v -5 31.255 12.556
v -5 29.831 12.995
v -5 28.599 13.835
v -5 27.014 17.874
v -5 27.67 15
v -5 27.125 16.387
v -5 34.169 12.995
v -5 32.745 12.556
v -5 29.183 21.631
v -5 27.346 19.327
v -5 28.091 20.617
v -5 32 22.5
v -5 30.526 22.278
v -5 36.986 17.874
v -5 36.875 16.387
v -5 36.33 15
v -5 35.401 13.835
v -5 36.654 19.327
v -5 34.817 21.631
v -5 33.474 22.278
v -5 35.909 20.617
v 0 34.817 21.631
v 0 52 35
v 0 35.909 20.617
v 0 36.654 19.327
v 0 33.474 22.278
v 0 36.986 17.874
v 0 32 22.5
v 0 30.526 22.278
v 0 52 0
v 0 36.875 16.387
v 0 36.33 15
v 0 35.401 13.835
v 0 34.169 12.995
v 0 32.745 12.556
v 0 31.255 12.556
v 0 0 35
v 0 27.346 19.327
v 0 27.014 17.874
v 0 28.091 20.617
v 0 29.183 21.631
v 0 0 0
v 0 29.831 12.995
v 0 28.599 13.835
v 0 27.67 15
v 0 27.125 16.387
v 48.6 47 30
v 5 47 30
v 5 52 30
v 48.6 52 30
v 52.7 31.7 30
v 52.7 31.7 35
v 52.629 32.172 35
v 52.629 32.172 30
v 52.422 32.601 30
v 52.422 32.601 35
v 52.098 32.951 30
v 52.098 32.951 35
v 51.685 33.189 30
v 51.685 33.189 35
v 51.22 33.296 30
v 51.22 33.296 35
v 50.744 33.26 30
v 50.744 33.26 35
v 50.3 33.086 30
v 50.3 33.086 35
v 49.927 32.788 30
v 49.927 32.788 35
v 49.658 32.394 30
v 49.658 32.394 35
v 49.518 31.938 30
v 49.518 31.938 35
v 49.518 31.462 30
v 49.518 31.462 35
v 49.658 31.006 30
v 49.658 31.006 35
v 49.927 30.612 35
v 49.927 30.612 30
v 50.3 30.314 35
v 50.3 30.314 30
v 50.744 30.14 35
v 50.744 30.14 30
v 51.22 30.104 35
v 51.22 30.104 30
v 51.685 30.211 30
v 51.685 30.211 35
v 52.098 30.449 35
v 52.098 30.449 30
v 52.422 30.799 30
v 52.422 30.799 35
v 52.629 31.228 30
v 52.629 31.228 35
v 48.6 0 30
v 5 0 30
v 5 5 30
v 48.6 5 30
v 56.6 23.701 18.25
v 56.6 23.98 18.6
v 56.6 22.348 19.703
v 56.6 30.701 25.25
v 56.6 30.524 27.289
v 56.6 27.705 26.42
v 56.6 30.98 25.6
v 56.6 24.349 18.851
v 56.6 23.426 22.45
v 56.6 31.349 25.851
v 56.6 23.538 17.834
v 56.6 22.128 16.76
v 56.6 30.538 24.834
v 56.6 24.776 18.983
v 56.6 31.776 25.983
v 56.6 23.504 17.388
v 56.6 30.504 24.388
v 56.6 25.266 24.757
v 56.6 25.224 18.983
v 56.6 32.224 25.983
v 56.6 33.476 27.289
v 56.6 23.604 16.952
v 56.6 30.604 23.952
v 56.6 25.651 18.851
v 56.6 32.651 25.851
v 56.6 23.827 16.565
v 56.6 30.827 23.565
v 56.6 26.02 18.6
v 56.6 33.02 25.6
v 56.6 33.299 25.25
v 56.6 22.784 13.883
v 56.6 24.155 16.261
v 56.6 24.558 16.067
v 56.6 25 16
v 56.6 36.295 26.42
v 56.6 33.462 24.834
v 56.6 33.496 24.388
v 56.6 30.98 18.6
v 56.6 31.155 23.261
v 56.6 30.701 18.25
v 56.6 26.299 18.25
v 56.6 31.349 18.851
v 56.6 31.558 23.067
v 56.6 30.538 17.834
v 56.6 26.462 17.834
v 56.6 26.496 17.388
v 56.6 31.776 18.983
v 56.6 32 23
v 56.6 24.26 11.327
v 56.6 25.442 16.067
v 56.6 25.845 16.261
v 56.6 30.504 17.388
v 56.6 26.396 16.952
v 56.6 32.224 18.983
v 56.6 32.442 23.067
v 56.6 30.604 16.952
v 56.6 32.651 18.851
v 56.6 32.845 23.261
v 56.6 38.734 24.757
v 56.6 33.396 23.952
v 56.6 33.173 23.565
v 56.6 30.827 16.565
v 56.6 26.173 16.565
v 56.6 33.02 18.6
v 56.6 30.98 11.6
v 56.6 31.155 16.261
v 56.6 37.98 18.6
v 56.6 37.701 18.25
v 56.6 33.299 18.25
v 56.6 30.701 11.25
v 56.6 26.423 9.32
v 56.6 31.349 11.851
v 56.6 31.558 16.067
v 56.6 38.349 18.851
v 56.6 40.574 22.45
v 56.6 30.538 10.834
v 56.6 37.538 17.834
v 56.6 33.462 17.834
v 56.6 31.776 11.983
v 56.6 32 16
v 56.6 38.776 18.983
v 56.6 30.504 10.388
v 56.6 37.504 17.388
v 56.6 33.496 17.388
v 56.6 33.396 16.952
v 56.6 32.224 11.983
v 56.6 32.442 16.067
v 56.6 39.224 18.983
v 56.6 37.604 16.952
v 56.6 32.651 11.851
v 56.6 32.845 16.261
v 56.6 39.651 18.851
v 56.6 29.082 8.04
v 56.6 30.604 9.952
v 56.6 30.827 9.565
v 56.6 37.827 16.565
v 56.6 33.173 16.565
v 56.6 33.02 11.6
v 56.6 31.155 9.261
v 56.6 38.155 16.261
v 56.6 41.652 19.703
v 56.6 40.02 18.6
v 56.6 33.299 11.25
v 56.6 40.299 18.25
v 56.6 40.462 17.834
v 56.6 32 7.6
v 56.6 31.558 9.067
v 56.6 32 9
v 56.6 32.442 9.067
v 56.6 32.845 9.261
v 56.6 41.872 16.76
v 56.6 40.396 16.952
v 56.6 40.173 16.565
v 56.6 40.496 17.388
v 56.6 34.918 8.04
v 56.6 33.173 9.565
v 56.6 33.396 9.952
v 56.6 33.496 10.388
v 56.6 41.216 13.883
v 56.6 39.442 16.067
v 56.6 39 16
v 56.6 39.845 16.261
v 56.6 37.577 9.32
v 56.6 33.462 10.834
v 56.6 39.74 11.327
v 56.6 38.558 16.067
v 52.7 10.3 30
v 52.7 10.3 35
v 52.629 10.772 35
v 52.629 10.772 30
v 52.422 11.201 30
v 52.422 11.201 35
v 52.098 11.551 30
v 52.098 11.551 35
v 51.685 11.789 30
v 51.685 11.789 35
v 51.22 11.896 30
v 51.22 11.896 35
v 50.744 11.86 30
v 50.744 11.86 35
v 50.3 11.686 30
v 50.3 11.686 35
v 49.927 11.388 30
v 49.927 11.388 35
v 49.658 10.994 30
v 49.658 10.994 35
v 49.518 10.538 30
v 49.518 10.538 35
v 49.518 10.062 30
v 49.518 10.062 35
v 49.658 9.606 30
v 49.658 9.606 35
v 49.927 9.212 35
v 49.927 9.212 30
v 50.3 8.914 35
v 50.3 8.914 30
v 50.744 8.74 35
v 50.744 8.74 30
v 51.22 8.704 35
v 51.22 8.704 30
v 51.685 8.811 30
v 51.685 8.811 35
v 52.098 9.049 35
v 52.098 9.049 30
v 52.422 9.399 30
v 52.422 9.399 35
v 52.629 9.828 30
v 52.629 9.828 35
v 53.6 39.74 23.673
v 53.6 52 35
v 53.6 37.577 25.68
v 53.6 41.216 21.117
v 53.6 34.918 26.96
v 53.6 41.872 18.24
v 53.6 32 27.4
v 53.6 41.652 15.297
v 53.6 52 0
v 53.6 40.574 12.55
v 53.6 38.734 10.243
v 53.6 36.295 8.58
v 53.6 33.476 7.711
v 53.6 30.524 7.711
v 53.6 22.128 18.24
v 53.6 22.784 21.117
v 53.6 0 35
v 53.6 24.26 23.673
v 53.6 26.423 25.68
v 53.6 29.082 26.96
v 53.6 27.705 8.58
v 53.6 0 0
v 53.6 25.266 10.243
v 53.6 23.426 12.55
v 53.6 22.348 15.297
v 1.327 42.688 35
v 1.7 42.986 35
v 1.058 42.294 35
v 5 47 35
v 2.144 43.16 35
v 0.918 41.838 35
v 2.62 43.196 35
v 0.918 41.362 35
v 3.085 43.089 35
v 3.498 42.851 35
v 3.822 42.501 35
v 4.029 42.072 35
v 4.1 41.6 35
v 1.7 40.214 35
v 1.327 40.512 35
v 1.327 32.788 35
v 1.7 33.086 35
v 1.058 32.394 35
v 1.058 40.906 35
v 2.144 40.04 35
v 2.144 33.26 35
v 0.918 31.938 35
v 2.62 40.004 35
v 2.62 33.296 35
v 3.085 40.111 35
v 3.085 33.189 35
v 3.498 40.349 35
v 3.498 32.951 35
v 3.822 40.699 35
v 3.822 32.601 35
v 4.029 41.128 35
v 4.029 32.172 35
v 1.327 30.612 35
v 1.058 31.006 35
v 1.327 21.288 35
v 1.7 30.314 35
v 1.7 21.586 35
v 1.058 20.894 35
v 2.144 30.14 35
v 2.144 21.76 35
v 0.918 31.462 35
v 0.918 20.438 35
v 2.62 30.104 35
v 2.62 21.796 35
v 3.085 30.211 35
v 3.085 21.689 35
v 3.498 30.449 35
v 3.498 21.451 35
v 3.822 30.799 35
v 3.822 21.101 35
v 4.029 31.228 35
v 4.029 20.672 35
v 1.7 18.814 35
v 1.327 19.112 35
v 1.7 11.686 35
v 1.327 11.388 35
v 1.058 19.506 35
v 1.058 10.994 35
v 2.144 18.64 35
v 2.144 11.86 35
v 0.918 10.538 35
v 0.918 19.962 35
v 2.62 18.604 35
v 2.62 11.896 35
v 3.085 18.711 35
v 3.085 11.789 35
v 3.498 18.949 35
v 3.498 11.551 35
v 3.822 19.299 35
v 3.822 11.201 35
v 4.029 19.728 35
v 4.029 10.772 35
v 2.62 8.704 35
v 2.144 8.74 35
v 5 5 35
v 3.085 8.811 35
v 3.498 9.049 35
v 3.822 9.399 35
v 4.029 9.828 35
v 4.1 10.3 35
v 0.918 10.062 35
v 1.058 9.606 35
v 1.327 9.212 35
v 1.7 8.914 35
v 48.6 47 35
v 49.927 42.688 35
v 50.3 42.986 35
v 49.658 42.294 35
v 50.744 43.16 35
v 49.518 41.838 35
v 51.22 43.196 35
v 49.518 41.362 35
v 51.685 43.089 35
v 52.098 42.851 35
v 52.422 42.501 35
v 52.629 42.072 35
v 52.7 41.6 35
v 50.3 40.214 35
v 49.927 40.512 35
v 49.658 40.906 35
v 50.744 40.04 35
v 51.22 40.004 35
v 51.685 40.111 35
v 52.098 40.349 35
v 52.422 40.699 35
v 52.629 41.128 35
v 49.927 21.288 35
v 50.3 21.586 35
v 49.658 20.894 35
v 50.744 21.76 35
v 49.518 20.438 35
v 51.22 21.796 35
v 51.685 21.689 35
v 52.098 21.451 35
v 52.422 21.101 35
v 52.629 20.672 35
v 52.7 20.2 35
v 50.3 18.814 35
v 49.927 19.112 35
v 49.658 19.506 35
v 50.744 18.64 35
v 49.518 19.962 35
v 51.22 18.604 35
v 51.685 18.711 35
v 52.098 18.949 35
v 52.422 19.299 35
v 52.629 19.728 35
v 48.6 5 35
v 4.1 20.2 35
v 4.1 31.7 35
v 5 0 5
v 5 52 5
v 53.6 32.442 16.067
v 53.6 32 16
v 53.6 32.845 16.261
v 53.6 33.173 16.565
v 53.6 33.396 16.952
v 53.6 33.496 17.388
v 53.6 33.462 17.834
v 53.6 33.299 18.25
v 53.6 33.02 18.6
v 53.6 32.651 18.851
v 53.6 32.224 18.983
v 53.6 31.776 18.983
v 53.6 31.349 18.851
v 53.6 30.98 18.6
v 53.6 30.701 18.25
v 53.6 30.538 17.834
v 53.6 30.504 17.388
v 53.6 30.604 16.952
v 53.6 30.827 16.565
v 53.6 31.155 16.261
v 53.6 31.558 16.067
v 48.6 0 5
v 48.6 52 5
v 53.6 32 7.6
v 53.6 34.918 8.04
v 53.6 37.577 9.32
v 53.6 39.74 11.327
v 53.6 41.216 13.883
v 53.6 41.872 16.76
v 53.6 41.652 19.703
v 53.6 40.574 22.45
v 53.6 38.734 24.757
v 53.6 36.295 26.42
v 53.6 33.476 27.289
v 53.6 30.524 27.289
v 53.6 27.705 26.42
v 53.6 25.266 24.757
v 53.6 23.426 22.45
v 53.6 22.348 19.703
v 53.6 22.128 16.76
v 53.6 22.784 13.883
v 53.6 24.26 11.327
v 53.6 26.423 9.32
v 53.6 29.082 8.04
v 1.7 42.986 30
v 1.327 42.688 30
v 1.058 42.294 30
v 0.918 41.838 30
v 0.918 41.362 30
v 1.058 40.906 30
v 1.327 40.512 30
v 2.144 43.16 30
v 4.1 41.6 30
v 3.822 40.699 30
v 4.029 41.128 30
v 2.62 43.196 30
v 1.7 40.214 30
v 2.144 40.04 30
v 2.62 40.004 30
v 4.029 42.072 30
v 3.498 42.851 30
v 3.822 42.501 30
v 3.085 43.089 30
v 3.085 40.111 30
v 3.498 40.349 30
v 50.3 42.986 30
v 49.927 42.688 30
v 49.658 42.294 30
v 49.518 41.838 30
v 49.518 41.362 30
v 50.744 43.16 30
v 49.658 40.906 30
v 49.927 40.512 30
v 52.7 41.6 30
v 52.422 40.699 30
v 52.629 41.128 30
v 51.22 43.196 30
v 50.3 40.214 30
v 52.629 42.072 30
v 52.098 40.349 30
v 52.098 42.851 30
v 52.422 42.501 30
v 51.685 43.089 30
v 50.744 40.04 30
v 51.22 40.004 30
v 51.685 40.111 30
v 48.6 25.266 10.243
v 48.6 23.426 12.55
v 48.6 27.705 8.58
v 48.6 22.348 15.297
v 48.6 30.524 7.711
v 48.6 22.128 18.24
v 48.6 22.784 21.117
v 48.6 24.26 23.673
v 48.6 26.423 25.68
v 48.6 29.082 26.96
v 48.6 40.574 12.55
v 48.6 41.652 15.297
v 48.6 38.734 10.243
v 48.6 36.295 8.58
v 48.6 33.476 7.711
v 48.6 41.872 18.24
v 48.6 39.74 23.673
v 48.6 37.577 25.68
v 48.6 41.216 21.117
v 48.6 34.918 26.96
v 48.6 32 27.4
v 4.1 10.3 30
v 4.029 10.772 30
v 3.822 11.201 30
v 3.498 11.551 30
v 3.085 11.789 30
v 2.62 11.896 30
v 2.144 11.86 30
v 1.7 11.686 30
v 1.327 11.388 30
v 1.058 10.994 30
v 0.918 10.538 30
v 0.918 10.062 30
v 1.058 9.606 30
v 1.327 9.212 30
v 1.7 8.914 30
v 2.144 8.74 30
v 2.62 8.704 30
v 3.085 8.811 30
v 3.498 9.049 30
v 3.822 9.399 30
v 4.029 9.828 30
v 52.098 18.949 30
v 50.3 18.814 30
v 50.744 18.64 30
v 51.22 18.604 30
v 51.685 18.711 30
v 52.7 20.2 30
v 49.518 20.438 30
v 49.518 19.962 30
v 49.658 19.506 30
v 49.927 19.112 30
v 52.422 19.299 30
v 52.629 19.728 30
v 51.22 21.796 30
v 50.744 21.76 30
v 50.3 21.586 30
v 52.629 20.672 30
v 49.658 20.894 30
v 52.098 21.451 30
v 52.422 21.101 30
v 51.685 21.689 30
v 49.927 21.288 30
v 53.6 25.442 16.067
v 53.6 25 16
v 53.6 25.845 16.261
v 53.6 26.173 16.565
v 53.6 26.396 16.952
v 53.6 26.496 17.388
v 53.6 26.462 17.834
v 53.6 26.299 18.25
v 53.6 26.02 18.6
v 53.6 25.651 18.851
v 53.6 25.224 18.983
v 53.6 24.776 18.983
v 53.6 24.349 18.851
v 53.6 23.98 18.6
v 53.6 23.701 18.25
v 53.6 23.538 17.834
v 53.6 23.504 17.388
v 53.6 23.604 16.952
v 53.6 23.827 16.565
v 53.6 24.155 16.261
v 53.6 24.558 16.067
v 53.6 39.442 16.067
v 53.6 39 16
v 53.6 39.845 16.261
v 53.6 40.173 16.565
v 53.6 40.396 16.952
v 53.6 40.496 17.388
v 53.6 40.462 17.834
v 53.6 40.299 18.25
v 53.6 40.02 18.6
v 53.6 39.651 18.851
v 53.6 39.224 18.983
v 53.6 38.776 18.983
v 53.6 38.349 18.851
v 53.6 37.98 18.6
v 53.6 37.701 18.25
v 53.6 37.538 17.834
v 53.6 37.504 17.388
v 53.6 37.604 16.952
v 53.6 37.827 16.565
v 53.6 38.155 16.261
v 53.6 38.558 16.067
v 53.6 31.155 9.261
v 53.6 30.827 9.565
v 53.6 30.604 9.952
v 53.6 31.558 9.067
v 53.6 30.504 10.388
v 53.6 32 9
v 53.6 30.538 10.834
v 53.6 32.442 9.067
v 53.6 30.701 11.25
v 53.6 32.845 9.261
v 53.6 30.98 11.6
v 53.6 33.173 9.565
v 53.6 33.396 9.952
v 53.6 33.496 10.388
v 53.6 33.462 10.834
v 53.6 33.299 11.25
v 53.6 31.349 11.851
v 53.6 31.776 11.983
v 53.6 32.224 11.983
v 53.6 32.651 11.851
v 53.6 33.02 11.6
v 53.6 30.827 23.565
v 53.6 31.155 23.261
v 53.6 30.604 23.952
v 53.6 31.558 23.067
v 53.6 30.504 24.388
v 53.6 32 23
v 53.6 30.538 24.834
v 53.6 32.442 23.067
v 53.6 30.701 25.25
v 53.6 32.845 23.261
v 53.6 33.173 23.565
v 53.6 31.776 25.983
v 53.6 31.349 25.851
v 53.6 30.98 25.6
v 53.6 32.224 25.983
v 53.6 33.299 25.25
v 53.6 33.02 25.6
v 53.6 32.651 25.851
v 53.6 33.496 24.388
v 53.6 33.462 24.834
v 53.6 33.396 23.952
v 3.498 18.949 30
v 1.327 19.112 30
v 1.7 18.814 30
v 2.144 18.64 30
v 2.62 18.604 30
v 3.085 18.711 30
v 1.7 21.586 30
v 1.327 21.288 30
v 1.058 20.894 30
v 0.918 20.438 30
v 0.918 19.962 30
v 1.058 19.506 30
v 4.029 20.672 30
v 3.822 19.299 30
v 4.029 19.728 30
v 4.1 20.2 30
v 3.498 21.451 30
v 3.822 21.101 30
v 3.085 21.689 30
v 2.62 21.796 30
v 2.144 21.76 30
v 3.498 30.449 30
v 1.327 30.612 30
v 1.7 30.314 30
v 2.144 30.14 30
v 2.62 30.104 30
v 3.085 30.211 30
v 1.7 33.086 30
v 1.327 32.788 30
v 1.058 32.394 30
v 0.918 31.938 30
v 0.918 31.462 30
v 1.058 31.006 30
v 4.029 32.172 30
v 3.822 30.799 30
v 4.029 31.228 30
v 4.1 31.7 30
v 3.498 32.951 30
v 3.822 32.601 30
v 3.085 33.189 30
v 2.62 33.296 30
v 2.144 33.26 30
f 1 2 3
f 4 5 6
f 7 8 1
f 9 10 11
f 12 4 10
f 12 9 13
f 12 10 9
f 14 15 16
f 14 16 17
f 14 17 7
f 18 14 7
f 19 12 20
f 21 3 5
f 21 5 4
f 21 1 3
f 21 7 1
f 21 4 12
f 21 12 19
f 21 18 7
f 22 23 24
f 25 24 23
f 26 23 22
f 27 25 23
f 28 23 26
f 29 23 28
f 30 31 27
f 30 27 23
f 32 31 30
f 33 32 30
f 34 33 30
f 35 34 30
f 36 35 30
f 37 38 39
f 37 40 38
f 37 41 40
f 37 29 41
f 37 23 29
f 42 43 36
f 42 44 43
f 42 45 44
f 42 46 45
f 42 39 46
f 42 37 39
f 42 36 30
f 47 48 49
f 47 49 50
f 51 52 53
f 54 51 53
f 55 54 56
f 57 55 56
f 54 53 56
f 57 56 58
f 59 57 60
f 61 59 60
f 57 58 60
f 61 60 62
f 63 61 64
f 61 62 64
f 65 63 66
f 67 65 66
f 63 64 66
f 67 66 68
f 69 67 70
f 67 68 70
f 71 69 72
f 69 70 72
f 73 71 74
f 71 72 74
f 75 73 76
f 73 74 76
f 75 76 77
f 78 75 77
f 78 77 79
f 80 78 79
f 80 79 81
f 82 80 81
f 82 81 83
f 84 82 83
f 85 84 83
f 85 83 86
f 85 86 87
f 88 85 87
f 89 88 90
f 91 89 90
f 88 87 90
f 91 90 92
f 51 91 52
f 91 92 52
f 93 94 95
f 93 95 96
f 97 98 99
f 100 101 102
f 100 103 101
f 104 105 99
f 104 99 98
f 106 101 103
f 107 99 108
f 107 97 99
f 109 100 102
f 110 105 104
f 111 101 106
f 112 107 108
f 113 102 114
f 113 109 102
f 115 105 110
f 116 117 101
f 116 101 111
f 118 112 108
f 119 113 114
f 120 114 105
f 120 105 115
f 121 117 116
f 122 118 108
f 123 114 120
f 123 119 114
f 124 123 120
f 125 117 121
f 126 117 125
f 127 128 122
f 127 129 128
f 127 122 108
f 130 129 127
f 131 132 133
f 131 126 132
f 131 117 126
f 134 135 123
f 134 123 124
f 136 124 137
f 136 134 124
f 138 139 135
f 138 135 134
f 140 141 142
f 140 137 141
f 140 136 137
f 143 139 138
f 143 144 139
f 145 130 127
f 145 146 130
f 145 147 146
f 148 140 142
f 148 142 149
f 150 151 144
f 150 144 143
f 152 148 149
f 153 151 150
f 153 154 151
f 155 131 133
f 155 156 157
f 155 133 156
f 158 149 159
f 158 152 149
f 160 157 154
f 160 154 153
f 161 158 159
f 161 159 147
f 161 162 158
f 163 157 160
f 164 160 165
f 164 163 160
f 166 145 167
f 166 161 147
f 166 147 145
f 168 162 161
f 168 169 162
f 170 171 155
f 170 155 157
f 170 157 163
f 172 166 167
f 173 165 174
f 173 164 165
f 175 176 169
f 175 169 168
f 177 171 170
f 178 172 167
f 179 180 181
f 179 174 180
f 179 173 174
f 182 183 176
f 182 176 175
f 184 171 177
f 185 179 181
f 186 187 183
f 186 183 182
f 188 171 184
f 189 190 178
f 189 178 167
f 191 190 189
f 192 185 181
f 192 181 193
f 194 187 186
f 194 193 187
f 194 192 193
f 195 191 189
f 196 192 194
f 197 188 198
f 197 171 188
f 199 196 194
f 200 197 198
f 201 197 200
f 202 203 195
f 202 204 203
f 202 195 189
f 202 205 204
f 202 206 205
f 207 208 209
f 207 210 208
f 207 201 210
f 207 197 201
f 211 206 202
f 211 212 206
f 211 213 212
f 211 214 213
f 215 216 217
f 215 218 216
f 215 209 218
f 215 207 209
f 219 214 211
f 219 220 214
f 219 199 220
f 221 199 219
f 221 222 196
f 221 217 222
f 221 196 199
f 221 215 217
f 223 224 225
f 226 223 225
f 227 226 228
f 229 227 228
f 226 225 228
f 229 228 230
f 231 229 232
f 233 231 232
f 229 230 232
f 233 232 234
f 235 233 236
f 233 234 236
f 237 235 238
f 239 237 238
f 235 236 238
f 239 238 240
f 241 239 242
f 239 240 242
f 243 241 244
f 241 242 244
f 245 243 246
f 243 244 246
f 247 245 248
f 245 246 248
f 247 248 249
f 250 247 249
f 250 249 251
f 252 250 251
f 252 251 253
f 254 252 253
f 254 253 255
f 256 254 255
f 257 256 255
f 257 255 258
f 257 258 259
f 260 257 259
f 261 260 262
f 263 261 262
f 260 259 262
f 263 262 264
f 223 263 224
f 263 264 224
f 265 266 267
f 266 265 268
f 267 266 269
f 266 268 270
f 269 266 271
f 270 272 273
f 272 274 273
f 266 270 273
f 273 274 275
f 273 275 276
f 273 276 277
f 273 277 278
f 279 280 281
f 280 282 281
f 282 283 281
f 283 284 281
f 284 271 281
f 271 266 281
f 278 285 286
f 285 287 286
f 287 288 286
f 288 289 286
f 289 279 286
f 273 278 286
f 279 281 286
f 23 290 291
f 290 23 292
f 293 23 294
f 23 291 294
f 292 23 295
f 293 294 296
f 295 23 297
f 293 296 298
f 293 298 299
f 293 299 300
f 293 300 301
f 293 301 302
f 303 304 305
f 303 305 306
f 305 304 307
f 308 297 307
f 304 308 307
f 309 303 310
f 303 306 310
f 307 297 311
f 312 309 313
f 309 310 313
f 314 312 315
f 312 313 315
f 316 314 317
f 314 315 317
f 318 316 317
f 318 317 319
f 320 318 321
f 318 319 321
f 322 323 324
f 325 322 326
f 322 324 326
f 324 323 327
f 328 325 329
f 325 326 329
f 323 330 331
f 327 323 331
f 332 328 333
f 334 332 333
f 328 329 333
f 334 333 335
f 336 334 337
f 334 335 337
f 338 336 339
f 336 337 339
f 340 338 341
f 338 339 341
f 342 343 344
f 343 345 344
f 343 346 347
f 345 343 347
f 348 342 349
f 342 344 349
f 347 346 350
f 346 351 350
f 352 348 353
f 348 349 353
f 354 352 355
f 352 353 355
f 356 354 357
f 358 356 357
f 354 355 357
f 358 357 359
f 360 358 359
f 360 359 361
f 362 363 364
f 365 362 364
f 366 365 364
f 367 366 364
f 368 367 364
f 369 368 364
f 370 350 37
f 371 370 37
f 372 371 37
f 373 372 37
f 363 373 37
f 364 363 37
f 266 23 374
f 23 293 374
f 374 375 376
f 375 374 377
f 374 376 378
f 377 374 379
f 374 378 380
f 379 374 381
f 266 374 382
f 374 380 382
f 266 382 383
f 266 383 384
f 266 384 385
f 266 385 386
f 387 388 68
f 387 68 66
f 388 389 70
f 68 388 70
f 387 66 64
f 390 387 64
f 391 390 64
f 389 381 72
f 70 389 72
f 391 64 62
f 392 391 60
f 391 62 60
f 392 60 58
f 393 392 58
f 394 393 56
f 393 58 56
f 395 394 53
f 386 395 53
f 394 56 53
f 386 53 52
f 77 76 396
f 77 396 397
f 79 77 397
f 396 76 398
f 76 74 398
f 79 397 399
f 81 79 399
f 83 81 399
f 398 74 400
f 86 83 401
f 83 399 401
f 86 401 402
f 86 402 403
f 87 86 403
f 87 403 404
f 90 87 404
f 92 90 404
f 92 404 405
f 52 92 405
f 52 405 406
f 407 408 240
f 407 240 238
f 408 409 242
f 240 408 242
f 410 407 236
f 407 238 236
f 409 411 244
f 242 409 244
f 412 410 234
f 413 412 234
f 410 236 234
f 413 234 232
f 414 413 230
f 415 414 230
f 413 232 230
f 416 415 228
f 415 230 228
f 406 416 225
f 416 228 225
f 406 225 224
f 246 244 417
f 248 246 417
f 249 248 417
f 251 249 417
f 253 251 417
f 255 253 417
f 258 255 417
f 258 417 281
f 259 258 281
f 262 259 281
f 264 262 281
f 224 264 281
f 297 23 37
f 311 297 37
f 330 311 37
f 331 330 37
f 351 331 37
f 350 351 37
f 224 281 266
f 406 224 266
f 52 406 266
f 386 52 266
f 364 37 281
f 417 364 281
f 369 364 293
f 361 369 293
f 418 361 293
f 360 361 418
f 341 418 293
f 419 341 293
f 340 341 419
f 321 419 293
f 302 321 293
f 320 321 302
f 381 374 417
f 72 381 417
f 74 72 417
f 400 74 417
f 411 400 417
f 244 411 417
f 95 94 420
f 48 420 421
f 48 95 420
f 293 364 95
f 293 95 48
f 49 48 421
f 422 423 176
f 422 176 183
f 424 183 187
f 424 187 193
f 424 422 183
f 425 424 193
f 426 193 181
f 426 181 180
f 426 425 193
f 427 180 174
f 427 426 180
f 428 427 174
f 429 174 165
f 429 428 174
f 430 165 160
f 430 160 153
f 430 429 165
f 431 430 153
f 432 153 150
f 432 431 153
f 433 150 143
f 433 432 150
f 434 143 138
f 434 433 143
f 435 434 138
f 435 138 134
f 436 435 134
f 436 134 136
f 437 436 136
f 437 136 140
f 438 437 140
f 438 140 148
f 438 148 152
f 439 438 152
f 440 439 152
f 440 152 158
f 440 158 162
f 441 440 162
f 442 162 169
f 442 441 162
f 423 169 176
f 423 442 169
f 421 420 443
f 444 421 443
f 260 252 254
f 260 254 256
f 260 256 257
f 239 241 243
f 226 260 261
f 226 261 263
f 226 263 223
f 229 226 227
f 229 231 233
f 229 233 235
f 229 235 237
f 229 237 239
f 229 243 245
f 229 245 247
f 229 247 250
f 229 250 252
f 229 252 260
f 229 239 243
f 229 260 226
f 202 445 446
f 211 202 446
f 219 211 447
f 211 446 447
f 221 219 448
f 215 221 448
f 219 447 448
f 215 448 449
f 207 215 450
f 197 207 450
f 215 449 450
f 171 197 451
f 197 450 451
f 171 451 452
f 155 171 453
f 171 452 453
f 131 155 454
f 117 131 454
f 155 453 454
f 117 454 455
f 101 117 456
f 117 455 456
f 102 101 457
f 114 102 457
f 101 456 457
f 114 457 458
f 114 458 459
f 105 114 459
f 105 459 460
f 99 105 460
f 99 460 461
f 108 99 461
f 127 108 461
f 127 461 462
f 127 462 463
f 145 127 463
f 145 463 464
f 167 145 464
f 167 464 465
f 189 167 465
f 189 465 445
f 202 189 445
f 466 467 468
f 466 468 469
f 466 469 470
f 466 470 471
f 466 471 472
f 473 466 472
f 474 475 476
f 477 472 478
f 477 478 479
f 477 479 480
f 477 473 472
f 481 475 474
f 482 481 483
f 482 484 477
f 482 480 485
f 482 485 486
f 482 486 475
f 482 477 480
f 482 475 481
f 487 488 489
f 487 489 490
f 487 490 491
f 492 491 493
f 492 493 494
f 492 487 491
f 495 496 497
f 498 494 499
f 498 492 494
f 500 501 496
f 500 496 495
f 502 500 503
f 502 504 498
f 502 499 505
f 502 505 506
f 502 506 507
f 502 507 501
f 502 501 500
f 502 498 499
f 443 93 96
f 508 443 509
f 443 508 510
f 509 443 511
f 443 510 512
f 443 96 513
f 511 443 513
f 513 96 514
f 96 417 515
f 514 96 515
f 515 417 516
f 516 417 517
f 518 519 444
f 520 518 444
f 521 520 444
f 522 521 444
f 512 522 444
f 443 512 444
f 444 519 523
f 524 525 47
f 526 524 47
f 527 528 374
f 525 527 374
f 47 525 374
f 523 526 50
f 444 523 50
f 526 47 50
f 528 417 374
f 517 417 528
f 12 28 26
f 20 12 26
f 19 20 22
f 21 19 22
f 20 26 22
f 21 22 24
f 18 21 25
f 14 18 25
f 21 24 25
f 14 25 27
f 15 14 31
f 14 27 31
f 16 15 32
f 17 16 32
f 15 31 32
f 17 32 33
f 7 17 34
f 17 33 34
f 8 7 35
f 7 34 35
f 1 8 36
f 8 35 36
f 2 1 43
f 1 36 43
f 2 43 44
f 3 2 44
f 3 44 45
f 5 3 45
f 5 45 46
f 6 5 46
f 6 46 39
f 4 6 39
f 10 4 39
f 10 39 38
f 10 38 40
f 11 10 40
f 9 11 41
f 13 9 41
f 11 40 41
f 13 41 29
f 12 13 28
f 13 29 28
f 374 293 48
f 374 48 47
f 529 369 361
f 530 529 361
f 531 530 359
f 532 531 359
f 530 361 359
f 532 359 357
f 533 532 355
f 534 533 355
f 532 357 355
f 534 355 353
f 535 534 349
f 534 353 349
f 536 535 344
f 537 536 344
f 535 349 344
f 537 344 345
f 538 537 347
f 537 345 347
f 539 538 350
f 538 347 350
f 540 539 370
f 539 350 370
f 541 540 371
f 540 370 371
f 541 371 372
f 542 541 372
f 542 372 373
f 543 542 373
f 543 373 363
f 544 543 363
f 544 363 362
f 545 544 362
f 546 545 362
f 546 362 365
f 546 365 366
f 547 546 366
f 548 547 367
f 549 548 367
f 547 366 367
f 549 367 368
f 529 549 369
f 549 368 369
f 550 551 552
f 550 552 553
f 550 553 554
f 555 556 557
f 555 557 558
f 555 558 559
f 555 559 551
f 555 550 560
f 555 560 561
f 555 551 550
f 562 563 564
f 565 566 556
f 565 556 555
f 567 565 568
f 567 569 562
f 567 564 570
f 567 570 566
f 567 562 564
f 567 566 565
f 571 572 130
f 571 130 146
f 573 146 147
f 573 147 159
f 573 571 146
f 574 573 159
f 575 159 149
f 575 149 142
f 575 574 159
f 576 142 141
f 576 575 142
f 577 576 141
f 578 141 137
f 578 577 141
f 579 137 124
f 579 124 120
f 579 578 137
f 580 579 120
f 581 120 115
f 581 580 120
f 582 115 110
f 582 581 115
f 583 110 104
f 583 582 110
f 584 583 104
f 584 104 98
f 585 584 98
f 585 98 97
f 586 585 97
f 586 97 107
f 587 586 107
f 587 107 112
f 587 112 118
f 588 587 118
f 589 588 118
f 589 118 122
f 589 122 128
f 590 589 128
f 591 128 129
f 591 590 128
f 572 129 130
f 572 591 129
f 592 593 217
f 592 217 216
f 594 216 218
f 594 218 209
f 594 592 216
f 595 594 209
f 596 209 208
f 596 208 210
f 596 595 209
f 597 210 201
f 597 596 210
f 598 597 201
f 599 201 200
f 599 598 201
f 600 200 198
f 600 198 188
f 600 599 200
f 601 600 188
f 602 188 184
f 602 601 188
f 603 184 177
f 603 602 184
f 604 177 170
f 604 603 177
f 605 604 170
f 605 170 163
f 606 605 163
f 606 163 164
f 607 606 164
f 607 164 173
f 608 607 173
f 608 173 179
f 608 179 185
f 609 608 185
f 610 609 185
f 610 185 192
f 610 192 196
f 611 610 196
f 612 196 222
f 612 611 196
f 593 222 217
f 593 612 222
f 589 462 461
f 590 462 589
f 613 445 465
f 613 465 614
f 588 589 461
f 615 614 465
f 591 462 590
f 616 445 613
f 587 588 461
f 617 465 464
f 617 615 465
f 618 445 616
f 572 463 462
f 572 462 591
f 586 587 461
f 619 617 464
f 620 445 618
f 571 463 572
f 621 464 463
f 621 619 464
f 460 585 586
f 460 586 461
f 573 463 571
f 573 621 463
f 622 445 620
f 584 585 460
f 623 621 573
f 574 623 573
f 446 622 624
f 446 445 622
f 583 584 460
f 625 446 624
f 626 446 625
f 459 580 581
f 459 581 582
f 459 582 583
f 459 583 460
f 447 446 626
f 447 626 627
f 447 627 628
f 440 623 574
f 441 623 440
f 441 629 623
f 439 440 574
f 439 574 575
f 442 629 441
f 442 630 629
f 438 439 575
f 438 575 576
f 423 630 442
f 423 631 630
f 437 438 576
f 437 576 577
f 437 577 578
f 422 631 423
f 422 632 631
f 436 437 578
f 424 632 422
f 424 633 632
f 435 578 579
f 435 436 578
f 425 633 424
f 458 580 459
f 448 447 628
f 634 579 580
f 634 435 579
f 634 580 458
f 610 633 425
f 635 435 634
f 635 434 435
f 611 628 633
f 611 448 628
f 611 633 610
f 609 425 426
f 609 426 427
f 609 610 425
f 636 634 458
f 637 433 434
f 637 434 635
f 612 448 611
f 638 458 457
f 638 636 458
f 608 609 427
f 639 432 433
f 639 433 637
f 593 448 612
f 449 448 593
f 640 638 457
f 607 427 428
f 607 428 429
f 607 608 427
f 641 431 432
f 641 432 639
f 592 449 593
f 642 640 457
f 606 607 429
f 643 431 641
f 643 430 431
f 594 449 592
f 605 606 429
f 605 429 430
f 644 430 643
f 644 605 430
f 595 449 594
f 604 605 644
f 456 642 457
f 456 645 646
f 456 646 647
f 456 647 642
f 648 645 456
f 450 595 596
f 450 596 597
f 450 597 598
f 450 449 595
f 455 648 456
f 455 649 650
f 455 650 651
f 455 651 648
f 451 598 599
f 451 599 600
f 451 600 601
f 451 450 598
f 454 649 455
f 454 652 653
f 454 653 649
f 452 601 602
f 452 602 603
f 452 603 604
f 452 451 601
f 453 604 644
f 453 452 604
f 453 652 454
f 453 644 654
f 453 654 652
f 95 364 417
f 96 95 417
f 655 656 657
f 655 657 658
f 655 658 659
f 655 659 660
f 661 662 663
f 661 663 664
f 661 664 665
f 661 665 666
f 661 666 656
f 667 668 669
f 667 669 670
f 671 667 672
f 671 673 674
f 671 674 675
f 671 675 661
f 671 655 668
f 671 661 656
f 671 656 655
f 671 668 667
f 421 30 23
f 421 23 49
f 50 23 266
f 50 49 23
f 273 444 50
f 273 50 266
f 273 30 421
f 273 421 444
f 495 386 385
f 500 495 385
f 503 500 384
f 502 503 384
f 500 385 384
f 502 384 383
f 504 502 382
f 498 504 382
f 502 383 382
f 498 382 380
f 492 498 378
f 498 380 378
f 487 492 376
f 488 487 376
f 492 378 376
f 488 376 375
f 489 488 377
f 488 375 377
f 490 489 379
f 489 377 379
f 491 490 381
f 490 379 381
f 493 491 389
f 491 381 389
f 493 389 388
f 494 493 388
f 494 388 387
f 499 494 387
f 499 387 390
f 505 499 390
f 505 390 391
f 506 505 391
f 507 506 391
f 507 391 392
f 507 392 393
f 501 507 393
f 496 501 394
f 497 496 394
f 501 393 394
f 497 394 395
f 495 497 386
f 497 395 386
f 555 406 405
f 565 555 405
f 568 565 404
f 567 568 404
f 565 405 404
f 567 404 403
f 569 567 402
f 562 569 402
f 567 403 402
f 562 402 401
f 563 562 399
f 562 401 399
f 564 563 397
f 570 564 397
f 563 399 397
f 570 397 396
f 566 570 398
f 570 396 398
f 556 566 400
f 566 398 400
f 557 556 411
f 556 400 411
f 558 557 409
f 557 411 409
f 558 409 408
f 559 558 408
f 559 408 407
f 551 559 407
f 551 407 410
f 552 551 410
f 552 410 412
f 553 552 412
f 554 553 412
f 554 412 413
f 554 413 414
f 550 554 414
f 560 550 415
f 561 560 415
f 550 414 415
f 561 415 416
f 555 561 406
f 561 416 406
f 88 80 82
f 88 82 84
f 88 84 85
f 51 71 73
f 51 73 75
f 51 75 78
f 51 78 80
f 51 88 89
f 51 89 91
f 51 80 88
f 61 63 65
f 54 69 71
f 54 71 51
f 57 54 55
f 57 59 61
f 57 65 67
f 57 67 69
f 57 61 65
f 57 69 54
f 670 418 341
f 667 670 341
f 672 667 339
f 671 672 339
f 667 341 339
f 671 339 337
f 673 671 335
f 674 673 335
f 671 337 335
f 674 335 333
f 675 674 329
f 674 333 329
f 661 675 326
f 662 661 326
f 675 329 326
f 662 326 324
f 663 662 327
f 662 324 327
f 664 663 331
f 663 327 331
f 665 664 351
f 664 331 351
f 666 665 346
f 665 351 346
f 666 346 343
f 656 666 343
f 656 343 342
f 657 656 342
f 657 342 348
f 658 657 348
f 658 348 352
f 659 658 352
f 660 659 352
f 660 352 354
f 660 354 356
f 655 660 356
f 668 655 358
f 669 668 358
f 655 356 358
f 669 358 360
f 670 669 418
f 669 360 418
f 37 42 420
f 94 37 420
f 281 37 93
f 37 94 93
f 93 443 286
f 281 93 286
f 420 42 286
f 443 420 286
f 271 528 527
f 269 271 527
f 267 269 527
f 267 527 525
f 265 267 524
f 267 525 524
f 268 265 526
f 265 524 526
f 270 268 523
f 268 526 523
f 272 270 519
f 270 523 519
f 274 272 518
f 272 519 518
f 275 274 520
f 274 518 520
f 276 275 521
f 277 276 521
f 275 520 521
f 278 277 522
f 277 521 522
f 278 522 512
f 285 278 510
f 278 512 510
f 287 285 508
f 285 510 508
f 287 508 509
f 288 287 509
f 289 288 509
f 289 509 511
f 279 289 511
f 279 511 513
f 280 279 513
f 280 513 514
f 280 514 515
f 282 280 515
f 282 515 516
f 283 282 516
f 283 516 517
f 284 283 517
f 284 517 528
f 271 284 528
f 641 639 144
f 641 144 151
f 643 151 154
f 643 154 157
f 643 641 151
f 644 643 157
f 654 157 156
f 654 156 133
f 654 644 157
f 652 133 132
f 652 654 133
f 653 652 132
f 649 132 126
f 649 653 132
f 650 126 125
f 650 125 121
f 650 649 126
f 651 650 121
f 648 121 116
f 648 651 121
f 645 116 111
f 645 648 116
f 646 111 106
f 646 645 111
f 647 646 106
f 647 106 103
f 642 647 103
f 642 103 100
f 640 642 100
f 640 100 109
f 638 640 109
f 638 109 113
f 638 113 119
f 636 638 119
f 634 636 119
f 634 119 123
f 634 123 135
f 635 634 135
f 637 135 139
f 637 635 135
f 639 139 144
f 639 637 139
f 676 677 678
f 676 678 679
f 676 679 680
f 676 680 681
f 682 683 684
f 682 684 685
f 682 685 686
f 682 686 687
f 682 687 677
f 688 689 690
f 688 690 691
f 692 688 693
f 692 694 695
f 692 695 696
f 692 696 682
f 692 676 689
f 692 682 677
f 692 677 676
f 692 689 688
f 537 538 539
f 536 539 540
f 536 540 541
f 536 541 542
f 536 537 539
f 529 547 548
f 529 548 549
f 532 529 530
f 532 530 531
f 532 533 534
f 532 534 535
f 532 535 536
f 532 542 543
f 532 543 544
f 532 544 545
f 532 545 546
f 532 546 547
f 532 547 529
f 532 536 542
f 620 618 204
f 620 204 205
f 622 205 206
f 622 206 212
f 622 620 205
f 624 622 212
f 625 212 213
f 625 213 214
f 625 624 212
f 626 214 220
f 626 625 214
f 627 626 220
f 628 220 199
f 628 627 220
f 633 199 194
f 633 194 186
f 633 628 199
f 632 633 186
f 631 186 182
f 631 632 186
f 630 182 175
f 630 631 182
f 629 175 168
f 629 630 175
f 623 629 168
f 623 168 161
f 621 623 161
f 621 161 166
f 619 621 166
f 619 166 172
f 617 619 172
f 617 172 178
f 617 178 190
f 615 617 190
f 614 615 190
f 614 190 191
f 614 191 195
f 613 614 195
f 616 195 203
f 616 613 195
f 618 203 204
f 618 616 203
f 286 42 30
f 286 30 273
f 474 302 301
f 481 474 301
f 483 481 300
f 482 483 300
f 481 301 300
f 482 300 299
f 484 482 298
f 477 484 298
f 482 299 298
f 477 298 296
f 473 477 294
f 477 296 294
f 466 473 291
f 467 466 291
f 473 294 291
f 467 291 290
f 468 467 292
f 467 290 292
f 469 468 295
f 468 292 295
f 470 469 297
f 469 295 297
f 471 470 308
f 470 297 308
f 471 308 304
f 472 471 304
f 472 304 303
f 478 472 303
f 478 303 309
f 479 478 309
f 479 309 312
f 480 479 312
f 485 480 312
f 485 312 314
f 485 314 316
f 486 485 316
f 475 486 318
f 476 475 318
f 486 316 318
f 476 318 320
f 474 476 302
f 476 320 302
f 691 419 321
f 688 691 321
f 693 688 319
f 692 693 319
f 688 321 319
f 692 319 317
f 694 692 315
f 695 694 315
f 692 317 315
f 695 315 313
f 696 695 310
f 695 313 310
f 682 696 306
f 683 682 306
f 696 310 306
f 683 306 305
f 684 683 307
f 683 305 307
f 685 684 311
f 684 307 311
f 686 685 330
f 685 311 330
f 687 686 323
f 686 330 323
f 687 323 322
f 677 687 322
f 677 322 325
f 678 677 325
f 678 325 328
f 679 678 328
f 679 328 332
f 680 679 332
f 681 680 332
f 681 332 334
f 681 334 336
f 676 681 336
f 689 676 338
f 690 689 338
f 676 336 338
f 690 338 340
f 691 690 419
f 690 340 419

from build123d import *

# Parameters (mm, degrees)
SKETCH1_W           = 53.6
SKETCH1_H           = 35
SKETCH1_W_2         = 43.6
SKETCH1_H_2         = 25
BOSS_EXTRUDE1_DEPTH = 52
SKETCH2_W           = 43.6
SKETCH2_H           = 42
CUT_EXTRUDE1_DEPTH  = 5
SKETCH3_R           = 1.6
SKETCH3_W           = 40
SKETCH3_H           = 20.5
CUT_EXTRUDE2_DEPTH  = 5
SKETCH4_R           = 9.9
SKETCH4_R_2         = 1.5
BOSS_EXTRUDE2_DEPTH = 3
SKETCH5_R           = 9.9
CUT_EXTRUDE3_DEPTH  = 5
SKETCH6_R           = 5
BOSS_EXTRUDE3_DEPTH = 5


with BuildPart() as part:
    # Sketch1 → Boss-Extrude1 (new body)
    with BuildSketch(Plane(origin=(0, 0, 0), x_dir=(1, 0, 0), z_dir=(0, 1, 0))):
        with Locations((26.8, -17.5)):
            Rectangle(SKETCH1_W, SKETCH1_H)
        with Locations((26.8, -17.5)):
            Rectangle(SKETCH1_W_2, SKETCH1_H_2, mode=Mode.SUBTRACT)
    extrude(amount=BOSS_EXTRUDE1_DEPTH)

    # Sketch2 → Cut-Extrude1 (cut)
    with BuildSketch(Plane.XY.offset(35)):
        with Locations((26.8, 26)):
            Rectangle(SKETCH2_W, SKETCH2_H)
    extrude(amount=-CUT_EXTRUDE1_DEPTH, mode=Mode.SUBTRACT)

    # Sketch3 → Cut-Extrude2 (cut)
    with BuildSketch(Plane.XY.offset(35)):
        with Locations((51.1, 20.2)):
            Circle(SKETCH3_R)
        with Locations((51.1, 10.3)):
            Circle(SKETCH3_R)
        with Locations((2.5, 10.3)):
            Circle(SKETCH3_R)
        with Locations((2.5, 20.2)):
            Circle(SKETCH3_R)
        with Locations((51.1, 41.6)):
            Circle(SKETCH3_R)
        with Locations((51.1, 31.7)):
            Circle(SKETCH3_R)
        with Locations((2.5, 31.7)):
            Circle(SKETCH3_R)
        with Locations((2.5, 41.6)):
            Circle(SKETCH3_R)
        with Locations((26.8, 15.25)):
            Rectangle(SKETCH3_W, SKETCH3_H)
        with Locations((26.8, 36.65)):
            Rectangle(SKETCH3_W, SKETCH3_H)
    extrude(amount=-CUT_EXTRUDE2_DEPTH, mode=Mode.SUBTRACT)

    # Sketch4 → Boss-Extrude2 (add)
    with BuildSketch(Plane(origin=(53.6, 0, 0), x_dir=(0, 0, -1), z_dir=(1, 0, 0))):
        with Locations((-17.5, 32)):
            Circle(SKETCH4_R)
        with Locations((-17.5, 39)):
            Circle(SKETCH4_R_2, mode=Mode.SUBTRACT)
        with Locations((-10.5, 32)):
            Circle(SKETCH4_R_2, mode=Mode.SUBTRACT)
        with Locations((-17.5, 25)):
            Circle(SKETCH4_R_2, mode=Mode.SUBTRACT)
        with Locations((-24.5, 32)):
            Circle(SKETCH4_R_2, mode=Mode.SUBTRACT)
        with Locations((-17.5, 32)):
            Circle(SKETCH4_R_2, mode=Mode.SUBTRACT)
    extrude(amount=BOSS_EXTRUDE2_DEPTH)

    # Sketch5 → Cut-Extrude3 (cut)
    with BuildSketch(Plane.ZY.offset(-48.6)):
        with Locations((17.5, 32)):
            Circle(SKETCH5_R)
    extrude(amount=-CUT_EXTRUDE3_DEPTH, mode=Mode.SUBTRACT)


with BuildPart() as cut_extrude3_piece_1:
    # of the separate pieces the step leaves, piece 1, a body of its own (cut_extrude3_pieces)
    add(part.part.solids().sort_by_distance((0, 0, 0))[0])

    # Sketch6 → Boss-Extrude3 (add)
    with BuildSketch(Plane.ZY):
        with Locations((17.5, 32)):
            Circle(SKETCH6_R)
    extrude(amount=BOSS_EXTRUDE3_DEPTH)


with BuildPart() as cut_extrude3_piece_2:
    # of the separate pieces the step leaves, piece 2, a body of its own (cut_extrude3_pieces)
    add(part.part.solids().sort_by_distance((56.6, 32, 7.6))[0])


solid = Compound([cut_extrude3_piece_1.part, cut_extrude3_piece_2.part])
